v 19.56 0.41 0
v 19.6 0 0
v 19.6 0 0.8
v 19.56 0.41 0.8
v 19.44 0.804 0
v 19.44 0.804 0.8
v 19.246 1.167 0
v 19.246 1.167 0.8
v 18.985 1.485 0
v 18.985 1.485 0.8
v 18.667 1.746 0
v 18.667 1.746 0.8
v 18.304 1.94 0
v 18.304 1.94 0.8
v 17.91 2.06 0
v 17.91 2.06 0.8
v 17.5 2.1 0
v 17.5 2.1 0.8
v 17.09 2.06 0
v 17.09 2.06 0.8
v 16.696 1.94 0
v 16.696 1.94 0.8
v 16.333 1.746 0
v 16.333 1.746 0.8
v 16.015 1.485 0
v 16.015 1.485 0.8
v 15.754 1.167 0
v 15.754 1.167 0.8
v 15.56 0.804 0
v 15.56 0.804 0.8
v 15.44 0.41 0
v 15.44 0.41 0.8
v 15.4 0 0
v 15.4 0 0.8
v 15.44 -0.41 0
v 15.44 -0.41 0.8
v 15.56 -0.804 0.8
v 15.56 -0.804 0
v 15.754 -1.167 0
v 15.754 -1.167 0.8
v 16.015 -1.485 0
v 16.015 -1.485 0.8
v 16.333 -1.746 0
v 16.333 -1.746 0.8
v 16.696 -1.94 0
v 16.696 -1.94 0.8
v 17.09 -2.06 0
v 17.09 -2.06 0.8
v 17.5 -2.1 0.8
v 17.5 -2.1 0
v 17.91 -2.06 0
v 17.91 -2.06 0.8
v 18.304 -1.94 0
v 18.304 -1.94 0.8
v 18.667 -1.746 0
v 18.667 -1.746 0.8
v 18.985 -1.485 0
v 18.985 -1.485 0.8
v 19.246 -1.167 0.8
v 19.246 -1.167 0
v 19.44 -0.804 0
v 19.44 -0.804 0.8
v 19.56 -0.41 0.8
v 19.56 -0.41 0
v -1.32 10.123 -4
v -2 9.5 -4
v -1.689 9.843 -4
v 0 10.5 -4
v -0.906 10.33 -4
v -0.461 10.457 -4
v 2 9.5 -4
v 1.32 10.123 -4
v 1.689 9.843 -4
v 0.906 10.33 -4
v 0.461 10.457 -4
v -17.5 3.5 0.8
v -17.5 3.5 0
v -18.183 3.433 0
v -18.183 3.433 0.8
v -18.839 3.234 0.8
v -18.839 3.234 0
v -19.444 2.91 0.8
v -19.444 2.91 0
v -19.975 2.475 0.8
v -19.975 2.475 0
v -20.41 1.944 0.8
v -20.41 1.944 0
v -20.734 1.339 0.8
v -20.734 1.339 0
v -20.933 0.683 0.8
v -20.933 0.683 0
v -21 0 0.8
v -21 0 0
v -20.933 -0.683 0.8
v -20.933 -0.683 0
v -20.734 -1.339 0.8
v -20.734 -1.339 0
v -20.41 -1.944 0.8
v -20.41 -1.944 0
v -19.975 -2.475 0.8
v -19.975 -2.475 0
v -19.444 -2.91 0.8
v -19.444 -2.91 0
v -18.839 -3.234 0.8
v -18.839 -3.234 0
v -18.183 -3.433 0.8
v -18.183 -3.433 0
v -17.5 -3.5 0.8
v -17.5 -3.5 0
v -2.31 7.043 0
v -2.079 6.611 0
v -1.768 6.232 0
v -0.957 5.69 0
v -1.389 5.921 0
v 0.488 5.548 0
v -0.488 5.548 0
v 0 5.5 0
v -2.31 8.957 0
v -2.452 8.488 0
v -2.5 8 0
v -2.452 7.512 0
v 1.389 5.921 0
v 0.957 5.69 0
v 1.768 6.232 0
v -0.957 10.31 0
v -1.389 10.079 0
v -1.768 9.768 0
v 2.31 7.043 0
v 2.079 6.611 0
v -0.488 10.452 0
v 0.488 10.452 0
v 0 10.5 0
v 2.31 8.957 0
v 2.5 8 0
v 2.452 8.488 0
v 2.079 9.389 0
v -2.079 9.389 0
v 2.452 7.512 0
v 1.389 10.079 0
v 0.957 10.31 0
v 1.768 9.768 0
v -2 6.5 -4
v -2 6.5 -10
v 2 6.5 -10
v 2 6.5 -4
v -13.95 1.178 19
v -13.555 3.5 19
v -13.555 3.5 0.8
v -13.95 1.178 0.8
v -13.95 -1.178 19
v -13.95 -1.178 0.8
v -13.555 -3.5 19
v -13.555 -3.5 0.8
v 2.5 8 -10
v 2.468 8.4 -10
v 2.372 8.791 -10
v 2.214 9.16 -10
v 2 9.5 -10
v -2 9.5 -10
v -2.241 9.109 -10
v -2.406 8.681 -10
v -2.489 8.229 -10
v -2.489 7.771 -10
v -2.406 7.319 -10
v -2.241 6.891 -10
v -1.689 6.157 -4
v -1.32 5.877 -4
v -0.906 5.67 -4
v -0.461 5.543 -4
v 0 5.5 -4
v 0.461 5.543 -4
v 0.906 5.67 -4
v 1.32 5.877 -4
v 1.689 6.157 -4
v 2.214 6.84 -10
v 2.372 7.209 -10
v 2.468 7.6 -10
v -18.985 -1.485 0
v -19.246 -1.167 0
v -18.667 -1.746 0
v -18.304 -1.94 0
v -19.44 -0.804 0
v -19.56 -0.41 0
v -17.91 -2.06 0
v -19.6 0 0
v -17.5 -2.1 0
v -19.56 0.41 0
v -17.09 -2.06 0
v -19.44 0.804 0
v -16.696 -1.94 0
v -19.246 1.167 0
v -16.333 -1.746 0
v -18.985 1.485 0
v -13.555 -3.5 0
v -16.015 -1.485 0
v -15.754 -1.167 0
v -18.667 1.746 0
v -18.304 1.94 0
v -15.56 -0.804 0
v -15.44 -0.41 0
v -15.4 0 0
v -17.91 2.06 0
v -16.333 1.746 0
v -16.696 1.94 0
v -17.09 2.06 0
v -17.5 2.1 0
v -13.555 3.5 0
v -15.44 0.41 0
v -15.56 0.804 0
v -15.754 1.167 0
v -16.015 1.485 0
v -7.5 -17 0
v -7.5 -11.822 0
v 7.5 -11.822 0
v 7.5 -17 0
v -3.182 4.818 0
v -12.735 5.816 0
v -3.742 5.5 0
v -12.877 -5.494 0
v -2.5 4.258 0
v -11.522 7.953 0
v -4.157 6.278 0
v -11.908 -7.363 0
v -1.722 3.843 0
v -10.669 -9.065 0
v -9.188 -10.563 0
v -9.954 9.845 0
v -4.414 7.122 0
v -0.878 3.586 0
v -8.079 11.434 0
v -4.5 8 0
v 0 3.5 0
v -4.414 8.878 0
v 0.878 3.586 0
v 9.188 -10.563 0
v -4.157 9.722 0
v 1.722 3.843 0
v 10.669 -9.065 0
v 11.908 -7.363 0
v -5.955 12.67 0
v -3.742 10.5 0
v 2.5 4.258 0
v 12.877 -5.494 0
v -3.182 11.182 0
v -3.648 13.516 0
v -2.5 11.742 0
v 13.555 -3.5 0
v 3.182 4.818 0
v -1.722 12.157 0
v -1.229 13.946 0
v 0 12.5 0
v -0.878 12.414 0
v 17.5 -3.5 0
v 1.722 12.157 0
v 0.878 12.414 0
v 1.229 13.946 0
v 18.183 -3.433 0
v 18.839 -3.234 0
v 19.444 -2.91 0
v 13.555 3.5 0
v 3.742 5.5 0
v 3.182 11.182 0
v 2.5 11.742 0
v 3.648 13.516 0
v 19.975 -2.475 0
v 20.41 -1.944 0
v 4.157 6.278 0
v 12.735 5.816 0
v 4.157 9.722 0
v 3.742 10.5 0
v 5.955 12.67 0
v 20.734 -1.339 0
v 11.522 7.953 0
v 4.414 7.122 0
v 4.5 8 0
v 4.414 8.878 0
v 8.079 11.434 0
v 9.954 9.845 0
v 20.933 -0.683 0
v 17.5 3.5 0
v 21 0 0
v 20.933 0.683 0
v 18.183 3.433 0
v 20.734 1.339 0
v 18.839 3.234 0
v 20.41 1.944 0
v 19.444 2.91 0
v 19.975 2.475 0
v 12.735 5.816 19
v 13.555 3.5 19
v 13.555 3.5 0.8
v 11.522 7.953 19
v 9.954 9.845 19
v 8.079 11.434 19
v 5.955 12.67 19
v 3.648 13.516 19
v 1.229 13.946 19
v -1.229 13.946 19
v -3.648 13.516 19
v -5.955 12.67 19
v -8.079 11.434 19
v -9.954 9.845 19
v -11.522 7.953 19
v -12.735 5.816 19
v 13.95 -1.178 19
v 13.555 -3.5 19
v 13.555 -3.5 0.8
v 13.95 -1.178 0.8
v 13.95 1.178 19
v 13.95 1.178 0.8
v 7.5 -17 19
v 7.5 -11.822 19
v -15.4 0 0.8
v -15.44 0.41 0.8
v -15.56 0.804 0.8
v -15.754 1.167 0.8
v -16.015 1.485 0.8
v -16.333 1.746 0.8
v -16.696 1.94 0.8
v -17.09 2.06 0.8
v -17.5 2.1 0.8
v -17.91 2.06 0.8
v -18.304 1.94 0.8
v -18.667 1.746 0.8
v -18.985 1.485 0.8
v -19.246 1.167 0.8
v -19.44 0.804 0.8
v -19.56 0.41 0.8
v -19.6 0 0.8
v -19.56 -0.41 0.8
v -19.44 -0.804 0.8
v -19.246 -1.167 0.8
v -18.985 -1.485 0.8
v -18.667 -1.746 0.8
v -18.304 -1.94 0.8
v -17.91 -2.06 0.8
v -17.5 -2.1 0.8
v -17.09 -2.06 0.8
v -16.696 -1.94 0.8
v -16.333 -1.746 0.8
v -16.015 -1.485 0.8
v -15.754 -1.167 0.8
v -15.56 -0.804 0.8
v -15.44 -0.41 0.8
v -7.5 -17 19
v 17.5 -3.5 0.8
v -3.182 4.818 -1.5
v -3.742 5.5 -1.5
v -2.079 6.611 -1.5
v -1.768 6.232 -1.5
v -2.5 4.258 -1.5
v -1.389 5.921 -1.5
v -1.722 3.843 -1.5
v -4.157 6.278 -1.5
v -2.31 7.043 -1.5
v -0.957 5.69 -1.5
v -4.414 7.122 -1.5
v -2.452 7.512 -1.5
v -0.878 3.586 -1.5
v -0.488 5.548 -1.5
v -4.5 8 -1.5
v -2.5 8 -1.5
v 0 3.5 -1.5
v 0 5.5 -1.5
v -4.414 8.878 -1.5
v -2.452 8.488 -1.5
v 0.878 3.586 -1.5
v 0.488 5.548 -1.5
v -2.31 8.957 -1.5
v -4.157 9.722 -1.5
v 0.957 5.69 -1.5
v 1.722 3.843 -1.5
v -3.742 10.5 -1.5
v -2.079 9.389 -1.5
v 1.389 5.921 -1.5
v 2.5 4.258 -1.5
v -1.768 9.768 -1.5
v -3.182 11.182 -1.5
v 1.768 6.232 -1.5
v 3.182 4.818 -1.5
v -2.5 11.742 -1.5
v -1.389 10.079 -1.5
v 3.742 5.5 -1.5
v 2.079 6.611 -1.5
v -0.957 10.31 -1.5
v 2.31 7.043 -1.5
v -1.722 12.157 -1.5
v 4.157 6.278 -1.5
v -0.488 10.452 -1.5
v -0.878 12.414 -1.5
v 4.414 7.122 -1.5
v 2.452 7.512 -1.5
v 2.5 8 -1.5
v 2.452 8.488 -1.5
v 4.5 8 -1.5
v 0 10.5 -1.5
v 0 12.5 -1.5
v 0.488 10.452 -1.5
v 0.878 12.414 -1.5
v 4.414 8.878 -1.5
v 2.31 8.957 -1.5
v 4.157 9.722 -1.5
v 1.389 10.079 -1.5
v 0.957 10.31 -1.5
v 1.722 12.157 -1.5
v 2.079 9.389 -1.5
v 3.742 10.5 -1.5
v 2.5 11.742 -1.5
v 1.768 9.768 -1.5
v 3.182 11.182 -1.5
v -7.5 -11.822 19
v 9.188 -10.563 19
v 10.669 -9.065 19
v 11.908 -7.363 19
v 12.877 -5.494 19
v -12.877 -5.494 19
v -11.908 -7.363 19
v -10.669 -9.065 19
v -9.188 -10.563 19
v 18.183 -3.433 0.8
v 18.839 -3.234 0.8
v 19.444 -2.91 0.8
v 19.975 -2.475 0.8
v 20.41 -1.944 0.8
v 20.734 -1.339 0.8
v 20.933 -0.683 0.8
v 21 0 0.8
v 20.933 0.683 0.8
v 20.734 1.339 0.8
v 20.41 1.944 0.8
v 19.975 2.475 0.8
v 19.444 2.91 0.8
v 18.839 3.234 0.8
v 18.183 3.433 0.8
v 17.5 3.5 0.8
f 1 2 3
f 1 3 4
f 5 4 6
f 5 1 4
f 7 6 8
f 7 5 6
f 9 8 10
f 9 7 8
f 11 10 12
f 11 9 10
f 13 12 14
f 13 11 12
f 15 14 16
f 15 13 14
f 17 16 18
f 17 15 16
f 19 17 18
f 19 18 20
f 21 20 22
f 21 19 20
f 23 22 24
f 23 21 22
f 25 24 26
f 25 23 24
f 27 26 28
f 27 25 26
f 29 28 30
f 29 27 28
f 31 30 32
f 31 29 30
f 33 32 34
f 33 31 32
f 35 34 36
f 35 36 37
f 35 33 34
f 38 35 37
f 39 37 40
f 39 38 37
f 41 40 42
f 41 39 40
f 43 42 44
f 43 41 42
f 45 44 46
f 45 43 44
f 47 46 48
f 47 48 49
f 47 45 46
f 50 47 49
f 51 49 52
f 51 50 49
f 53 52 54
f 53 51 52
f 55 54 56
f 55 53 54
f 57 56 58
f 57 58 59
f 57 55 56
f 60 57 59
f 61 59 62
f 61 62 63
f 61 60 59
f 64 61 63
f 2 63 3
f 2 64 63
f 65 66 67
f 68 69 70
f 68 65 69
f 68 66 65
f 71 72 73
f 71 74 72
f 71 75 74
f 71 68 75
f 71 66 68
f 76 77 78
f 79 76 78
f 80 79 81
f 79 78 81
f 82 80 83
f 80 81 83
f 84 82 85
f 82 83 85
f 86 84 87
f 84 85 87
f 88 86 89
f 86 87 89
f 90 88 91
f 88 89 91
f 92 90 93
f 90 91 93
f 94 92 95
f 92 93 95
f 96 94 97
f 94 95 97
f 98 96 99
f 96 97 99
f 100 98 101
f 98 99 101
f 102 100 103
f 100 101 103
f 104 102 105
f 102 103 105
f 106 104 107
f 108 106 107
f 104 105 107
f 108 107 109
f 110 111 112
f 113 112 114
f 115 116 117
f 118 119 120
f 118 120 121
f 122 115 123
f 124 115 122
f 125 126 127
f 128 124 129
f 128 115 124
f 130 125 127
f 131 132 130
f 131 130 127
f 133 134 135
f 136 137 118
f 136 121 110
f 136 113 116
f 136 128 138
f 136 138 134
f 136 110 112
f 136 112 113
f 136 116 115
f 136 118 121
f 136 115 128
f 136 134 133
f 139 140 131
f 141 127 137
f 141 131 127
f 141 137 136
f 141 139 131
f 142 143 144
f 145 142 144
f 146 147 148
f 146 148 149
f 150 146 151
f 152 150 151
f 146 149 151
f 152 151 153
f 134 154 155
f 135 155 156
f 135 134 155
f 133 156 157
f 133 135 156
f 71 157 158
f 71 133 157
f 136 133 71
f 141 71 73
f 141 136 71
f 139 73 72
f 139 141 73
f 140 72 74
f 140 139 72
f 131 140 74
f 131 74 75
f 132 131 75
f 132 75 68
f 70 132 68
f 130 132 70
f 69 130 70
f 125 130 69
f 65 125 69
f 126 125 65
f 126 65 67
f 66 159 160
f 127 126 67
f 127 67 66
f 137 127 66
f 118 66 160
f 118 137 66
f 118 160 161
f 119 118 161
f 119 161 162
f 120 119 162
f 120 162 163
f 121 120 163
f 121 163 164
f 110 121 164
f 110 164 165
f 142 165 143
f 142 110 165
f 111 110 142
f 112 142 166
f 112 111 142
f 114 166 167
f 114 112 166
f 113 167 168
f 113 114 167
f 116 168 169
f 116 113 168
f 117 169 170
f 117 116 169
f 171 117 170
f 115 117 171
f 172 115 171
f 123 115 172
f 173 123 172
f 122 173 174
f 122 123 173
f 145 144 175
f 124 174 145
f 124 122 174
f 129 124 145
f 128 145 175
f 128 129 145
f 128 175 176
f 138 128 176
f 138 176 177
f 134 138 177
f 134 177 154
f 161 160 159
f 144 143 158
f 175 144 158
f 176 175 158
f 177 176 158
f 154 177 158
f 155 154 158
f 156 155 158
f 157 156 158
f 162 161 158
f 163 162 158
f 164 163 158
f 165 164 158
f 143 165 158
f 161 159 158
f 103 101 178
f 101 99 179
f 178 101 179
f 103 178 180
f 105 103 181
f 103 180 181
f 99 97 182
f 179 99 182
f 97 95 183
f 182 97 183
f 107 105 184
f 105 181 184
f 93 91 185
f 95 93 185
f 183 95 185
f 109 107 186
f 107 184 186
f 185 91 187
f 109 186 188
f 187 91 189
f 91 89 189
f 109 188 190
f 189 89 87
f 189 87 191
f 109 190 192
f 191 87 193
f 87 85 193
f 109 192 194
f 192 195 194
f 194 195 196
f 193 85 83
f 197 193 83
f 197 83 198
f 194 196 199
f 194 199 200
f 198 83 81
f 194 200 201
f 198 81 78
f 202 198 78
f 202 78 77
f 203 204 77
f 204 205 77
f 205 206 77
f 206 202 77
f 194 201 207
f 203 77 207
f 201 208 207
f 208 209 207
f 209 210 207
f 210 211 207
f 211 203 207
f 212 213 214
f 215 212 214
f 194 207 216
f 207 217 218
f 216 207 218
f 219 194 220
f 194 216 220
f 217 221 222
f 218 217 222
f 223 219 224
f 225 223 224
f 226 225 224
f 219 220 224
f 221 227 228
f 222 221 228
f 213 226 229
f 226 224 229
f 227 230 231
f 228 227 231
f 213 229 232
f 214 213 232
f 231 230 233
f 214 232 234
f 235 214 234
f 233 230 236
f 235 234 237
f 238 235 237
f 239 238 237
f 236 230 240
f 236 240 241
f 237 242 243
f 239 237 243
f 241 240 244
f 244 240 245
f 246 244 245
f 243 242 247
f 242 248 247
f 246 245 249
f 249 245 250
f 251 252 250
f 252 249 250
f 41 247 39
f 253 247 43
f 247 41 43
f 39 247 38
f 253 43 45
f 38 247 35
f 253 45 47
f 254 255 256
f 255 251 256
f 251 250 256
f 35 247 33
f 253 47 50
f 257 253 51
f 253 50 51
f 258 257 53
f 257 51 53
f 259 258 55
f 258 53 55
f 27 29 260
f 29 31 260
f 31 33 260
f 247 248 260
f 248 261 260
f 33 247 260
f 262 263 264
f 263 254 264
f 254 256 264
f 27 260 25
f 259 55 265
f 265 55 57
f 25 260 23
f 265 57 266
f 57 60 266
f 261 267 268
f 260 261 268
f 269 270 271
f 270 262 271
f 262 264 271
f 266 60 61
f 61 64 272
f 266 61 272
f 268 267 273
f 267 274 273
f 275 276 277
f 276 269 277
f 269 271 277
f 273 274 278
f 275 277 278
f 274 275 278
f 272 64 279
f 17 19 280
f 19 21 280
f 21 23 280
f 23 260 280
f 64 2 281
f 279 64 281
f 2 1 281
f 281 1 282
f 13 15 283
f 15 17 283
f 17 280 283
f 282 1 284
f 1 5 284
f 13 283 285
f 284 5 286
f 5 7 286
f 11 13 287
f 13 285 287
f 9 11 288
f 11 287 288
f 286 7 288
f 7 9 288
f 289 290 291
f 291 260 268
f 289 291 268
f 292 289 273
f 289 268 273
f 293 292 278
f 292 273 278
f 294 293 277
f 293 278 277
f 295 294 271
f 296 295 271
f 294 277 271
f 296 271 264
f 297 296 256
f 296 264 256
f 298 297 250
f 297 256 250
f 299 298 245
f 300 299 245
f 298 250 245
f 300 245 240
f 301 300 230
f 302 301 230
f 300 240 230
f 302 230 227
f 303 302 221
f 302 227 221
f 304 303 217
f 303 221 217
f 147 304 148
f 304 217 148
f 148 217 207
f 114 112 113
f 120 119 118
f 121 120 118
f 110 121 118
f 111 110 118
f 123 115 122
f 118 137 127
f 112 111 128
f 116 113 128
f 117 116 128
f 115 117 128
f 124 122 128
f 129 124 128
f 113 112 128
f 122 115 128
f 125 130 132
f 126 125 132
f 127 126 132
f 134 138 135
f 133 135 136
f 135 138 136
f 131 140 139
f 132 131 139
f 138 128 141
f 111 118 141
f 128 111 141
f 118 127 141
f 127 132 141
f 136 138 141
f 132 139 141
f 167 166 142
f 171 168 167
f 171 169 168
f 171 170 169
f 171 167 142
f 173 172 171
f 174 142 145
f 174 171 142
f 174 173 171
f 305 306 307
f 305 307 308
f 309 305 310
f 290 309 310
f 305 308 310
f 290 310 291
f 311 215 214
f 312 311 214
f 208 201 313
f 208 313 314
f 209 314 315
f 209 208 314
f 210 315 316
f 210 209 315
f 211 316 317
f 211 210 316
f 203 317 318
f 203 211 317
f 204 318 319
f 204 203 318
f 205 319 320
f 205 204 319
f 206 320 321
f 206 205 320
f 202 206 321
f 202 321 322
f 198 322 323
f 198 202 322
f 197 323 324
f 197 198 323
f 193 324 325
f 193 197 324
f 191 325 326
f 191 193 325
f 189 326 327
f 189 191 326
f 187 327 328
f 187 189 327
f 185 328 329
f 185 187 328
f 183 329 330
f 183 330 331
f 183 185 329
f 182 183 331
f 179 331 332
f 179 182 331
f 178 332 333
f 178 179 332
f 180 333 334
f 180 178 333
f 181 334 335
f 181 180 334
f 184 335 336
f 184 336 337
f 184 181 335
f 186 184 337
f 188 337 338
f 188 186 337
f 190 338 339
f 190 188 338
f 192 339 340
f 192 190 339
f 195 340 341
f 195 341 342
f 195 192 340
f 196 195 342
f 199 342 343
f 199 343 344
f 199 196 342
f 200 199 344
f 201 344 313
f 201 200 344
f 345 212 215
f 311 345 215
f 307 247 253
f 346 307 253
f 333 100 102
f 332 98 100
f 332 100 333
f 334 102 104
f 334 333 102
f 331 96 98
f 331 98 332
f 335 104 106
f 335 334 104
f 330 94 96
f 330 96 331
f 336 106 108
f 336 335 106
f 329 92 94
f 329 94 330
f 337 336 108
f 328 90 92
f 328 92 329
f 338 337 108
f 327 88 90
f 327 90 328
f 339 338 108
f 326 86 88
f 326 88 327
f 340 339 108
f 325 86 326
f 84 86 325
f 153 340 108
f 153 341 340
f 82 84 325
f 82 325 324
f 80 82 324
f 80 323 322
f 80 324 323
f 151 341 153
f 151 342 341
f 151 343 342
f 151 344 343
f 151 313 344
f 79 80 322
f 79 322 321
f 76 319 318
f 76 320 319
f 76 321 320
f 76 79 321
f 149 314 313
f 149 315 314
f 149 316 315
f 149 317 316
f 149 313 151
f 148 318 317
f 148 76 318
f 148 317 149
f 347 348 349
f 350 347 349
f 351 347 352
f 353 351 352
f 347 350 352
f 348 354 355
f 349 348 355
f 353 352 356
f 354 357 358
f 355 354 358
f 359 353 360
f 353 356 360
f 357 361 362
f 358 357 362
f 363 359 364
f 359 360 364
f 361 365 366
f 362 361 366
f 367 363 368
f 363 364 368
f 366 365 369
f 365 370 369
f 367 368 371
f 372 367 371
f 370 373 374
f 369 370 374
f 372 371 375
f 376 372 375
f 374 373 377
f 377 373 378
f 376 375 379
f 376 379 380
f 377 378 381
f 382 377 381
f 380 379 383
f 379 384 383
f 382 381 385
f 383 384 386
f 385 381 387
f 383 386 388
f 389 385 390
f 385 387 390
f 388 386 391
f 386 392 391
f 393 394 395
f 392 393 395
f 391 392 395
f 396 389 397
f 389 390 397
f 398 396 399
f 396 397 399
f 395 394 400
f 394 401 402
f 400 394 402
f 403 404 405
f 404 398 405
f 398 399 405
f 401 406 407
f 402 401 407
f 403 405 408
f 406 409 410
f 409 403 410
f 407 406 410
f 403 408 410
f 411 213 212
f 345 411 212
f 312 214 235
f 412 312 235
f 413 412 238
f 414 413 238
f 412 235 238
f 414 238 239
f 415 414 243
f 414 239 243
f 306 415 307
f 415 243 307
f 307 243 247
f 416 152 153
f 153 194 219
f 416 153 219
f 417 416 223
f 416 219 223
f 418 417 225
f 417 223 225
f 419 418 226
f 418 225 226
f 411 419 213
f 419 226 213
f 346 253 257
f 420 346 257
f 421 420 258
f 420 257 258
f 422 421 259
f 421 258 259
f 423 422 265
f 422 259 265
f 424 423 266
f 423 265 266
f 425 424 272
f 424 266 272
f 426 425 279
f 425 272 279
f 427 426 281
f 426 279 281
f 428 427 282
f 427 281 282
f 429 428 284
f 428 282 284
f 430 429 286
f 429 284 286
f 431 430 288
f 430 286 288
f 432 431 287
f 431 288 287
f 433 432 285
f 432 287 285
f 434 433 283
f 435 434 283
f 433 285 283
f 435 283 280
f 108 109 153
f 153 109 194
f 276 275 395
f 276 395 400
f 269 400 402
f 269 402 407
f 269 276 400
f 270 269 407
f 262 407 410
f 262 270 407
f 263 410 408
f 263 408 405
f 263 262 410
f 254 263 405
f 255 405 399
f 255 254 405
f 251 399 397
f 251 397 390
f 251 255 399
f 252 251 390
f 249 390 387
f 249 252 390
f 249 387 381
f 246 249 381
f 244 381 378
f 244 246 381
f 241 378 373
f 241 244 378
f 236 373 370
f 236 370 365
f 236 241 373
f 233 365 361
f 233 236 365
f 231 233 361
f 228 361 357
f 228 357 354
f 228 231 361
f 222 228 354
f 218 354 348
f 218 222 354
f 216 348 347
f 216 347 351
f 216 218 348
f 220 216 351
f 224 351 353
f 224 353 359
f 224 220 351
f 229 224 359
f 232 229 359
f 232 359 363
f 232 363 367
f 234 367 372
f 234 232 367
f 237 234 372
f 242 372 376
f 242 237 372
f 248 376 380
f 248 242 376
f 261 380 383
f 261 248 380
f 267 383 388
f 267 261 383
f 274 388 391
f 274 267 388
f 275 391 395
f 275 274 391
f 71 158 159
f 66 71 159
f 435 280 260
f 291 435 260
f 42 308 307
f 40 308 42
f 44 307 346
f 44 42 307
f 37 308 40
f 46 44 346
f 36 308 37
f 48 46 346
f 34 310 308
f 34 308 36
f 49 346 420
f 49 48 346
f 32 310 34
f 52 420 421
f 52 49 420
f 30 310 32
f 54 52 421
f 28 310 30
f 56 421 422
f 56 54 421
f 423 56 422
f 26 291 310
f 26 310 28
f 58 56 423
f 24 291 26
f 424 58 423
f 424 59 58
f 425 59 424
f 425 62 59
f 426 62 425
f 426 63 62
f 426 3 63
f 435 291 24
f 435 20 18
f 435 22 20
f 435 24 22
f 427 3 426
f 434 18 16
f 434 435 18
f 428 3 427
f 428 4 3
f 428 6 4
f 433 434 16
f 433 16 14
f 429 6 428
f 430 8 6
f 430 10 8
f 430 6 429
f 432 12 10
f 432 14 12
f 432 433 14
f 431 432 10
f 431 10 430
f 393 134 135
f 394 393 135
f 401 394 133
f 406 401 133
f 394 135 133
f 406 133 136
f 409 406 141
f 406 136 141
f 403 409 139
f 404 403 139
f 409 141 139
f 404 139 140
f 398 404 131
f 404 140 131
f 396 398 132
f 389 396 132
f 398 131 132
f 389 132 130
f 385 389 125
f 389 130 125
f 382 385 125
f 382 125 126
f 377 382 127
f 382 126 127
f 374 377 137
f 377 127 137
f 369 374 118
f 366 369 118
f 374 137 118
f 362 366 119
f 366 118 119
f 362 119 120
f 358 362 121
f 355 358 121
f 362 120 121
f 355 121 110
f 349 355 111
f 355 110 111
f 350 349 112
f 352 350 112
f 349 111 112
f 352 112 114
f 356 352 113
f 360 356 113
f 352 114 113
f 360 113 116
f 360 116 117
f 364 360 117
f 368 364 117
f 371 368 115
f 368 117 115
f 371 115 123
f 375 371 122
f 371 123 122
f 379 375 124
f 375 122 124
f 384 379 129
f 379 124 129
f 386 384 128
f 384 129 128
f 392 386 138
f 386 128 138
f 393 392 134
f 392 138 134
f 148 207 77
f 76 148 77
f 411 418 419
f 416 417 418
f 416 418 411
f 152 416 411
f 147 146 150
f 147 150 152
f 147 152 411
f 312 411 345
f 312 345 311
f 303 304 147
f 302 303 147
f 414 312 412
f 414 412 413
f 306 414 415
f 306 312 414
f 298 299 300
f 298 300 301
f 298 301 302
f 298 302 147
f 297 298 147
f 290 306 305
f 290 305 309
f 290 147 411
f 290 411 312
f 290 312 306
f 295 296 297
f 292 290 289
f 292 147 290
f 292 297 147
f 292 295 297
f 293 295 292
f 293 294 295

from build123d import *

# Parameters (mm, degrees)
F0_R     = 4.5
F0_R_2   = 2.5
F1_DEPTH = 19
F0_R_3   = 2.1
F2_DEPTH = 0.8
F3_DEPTH = 1.5
F4_DEPTH = 10
F6_DEPTH = 6


with BuildPart() as f1:
    # F0 (on Top) → F1 (new body)
    with BuildSketch(Plane.XY):
        with BuildLine():
            Line((7.5, -17), (7.5, -11.8215904175))
            ThreePointArc((7.5, -11.8215904175), (11.3201202815, -8.2374071656), (13.5554417117, -3.5))
            ThreePointArc((13.5554417117, -3.5), (14, 0), (13.5554417117, 3.5))
            ThreePointArc((13.5554417117, 3.5), (0, 14), (-13.5554417117, 3.5))
            ThreePointArc((-13.5554417117, 3.5), (-14, 0), (-13.5554417117, -3.5))
            ThreePointArc((-13.5554417117, -3.5), (-11.3201202815, -8.2374071656), (-7.5, -11.8215904175))
            Line((-7.5, -11.8215904175), (-7.5, -17))
            Line((-7.5, -17), (7.5, -17))
        make_face()
        with Locations((0, 8)):
            Circle(F0_R, mode=Mode.SUBTRACT)
        with Locations((0, 8)):
            Circle(F0_R)
        with Locations((0, 8)):
            Circle(F0_R_2, mode=Mode.SUBTRACT)
        with Locations((0, 8)):
            Circle(F0_R_2)
    extrude(amount=F1_DEPTH)

    # F0 (on Top) → F2 (join)
    with BuildSketch(Plane.XY):
        with BuildLine():
            ThreePointArc((-13.5554417117, -3.5), (-14, 0), (-13.5554417117, 3.5))
            Line((-13.5554417117, 3.5), (-17.5, 3.5))
            ThreePointArc((-17.5, 3.5), (-21, 0), (-17.5, -3.5))
            Line((-17.5, -3.5), (-13.5554417117, -3.5))
        make_face()
        with Locations((-17.5, 0)):
            Circle(F0_R_3, mode=Mode.SUBTRACT)
        with BuildLine():
            ThreePointArc((13.5554417117, 3.5), (14, 0), (13.5554417117, -3.5))
            Line((13.5554417117, -3.5), (17.5, -3.5))
            ThreePointArc((17.5, -3.5), (21, 0), (17.5, 3.5))
            Line((17.5, 3.5), (13.5554417117, 3.5))
        make_face()
        with Locations((17.5, 0)):
            Circle(F0_R_3, mode=Mode.SUBTRACT)
    extrude(amount=F2_DEPTH)

    # F0 (on Top) → F3 (join)
    with BuildSketch(Plane.XY):
        with Locations((0, 8)):
            Circle(F0_R)
        with Locations((0, 8)):
            Circle(F0_R_2, mode=Mode.SUBTRACT)
    extrude(amount=-F3_DEPTH)


with BuildPart() as f4:
    # F0 (on Top) → F4 (new body)
    with BuildSketch(Plane.XY):
        with Locations((0, 8)):
            Circle(F0_R_2)
    extrude(amount=-F4_DEPTH)


with BuildPart() as f6:
    # F5 (on face) → F6 (new body)
    with BuildSketch(Plane(origin=(0, 0, -10), x_dir=(1, 0, 0), z_dir=(0, 0, -1))):
        with BuildLine():
            Line((2, -6.5), (2.9143868635, -6.5))
            Line((2.9143868635, -6.5), (2.9143868635, -5.0171855837))
            Line((2.9143868635, -5.0171855837), (-2.9143868635, -5.0171855837))
            Line((-2.9143868635, -5.0171855837), (-2.9143868635, -6.5))
            Line((-2.9143868635, -6.5), (-2, -6.5))
            ThreePointArc((-2, -6.5), (0, -5.5), (2, -6.5))
        make_face()
        with BuildLine():
            Line((-2, -6.5), (2, -6.5))
            ThreePointArc((2, -6.5), (0, -5.5), (-2, -6.5))
        make_face()
    extrude(amount=-F6_DEPTH)


with BuildPart() as f6b:
    # F5 (on face) → F6, piece 2 (new body)
    with BuildSketch(Plane(origin=(0, 0, -10), x_dir=(1, 0, 0), z_dir=(0, 0, -1))):
        with BuildLine():
            ThreePointArc((-2, -9.5), (0, -10.5), (2, -9.5))
            Line((2, -9.5), (-2, -9.5))
        make_face()
        with BuildLine():
            Line((2.9143868635, -10.8300484717), (2.9143868635, -9.5))
            Line((2.9143868635, -9.5), (2, -9.5))
            ThreePointArc((2, -9.5), (0, -10.5), (-2, -9.5))
            Line((-2, -9.5), (-2.9143868635, -9.5))
            Line((-2.9143868635, -9.5), (-2.9143868635, -10.8300484717))
            Line((-2.9143868635, -10.8300484717), (2.9143868635, -10.8300484717))
        make_face()
    extrude(amount=-F6_DEPTH)


with BuildPart() as f4_1:
    add(f4.part)

    # F7: cut F6, F6b
    add(f6.part, mode=Mode.SUBTRACT)
    add(f6b.part, mode=Mode.SUBTRACT)


solid = Compound([f1.part, f4_1.part])
